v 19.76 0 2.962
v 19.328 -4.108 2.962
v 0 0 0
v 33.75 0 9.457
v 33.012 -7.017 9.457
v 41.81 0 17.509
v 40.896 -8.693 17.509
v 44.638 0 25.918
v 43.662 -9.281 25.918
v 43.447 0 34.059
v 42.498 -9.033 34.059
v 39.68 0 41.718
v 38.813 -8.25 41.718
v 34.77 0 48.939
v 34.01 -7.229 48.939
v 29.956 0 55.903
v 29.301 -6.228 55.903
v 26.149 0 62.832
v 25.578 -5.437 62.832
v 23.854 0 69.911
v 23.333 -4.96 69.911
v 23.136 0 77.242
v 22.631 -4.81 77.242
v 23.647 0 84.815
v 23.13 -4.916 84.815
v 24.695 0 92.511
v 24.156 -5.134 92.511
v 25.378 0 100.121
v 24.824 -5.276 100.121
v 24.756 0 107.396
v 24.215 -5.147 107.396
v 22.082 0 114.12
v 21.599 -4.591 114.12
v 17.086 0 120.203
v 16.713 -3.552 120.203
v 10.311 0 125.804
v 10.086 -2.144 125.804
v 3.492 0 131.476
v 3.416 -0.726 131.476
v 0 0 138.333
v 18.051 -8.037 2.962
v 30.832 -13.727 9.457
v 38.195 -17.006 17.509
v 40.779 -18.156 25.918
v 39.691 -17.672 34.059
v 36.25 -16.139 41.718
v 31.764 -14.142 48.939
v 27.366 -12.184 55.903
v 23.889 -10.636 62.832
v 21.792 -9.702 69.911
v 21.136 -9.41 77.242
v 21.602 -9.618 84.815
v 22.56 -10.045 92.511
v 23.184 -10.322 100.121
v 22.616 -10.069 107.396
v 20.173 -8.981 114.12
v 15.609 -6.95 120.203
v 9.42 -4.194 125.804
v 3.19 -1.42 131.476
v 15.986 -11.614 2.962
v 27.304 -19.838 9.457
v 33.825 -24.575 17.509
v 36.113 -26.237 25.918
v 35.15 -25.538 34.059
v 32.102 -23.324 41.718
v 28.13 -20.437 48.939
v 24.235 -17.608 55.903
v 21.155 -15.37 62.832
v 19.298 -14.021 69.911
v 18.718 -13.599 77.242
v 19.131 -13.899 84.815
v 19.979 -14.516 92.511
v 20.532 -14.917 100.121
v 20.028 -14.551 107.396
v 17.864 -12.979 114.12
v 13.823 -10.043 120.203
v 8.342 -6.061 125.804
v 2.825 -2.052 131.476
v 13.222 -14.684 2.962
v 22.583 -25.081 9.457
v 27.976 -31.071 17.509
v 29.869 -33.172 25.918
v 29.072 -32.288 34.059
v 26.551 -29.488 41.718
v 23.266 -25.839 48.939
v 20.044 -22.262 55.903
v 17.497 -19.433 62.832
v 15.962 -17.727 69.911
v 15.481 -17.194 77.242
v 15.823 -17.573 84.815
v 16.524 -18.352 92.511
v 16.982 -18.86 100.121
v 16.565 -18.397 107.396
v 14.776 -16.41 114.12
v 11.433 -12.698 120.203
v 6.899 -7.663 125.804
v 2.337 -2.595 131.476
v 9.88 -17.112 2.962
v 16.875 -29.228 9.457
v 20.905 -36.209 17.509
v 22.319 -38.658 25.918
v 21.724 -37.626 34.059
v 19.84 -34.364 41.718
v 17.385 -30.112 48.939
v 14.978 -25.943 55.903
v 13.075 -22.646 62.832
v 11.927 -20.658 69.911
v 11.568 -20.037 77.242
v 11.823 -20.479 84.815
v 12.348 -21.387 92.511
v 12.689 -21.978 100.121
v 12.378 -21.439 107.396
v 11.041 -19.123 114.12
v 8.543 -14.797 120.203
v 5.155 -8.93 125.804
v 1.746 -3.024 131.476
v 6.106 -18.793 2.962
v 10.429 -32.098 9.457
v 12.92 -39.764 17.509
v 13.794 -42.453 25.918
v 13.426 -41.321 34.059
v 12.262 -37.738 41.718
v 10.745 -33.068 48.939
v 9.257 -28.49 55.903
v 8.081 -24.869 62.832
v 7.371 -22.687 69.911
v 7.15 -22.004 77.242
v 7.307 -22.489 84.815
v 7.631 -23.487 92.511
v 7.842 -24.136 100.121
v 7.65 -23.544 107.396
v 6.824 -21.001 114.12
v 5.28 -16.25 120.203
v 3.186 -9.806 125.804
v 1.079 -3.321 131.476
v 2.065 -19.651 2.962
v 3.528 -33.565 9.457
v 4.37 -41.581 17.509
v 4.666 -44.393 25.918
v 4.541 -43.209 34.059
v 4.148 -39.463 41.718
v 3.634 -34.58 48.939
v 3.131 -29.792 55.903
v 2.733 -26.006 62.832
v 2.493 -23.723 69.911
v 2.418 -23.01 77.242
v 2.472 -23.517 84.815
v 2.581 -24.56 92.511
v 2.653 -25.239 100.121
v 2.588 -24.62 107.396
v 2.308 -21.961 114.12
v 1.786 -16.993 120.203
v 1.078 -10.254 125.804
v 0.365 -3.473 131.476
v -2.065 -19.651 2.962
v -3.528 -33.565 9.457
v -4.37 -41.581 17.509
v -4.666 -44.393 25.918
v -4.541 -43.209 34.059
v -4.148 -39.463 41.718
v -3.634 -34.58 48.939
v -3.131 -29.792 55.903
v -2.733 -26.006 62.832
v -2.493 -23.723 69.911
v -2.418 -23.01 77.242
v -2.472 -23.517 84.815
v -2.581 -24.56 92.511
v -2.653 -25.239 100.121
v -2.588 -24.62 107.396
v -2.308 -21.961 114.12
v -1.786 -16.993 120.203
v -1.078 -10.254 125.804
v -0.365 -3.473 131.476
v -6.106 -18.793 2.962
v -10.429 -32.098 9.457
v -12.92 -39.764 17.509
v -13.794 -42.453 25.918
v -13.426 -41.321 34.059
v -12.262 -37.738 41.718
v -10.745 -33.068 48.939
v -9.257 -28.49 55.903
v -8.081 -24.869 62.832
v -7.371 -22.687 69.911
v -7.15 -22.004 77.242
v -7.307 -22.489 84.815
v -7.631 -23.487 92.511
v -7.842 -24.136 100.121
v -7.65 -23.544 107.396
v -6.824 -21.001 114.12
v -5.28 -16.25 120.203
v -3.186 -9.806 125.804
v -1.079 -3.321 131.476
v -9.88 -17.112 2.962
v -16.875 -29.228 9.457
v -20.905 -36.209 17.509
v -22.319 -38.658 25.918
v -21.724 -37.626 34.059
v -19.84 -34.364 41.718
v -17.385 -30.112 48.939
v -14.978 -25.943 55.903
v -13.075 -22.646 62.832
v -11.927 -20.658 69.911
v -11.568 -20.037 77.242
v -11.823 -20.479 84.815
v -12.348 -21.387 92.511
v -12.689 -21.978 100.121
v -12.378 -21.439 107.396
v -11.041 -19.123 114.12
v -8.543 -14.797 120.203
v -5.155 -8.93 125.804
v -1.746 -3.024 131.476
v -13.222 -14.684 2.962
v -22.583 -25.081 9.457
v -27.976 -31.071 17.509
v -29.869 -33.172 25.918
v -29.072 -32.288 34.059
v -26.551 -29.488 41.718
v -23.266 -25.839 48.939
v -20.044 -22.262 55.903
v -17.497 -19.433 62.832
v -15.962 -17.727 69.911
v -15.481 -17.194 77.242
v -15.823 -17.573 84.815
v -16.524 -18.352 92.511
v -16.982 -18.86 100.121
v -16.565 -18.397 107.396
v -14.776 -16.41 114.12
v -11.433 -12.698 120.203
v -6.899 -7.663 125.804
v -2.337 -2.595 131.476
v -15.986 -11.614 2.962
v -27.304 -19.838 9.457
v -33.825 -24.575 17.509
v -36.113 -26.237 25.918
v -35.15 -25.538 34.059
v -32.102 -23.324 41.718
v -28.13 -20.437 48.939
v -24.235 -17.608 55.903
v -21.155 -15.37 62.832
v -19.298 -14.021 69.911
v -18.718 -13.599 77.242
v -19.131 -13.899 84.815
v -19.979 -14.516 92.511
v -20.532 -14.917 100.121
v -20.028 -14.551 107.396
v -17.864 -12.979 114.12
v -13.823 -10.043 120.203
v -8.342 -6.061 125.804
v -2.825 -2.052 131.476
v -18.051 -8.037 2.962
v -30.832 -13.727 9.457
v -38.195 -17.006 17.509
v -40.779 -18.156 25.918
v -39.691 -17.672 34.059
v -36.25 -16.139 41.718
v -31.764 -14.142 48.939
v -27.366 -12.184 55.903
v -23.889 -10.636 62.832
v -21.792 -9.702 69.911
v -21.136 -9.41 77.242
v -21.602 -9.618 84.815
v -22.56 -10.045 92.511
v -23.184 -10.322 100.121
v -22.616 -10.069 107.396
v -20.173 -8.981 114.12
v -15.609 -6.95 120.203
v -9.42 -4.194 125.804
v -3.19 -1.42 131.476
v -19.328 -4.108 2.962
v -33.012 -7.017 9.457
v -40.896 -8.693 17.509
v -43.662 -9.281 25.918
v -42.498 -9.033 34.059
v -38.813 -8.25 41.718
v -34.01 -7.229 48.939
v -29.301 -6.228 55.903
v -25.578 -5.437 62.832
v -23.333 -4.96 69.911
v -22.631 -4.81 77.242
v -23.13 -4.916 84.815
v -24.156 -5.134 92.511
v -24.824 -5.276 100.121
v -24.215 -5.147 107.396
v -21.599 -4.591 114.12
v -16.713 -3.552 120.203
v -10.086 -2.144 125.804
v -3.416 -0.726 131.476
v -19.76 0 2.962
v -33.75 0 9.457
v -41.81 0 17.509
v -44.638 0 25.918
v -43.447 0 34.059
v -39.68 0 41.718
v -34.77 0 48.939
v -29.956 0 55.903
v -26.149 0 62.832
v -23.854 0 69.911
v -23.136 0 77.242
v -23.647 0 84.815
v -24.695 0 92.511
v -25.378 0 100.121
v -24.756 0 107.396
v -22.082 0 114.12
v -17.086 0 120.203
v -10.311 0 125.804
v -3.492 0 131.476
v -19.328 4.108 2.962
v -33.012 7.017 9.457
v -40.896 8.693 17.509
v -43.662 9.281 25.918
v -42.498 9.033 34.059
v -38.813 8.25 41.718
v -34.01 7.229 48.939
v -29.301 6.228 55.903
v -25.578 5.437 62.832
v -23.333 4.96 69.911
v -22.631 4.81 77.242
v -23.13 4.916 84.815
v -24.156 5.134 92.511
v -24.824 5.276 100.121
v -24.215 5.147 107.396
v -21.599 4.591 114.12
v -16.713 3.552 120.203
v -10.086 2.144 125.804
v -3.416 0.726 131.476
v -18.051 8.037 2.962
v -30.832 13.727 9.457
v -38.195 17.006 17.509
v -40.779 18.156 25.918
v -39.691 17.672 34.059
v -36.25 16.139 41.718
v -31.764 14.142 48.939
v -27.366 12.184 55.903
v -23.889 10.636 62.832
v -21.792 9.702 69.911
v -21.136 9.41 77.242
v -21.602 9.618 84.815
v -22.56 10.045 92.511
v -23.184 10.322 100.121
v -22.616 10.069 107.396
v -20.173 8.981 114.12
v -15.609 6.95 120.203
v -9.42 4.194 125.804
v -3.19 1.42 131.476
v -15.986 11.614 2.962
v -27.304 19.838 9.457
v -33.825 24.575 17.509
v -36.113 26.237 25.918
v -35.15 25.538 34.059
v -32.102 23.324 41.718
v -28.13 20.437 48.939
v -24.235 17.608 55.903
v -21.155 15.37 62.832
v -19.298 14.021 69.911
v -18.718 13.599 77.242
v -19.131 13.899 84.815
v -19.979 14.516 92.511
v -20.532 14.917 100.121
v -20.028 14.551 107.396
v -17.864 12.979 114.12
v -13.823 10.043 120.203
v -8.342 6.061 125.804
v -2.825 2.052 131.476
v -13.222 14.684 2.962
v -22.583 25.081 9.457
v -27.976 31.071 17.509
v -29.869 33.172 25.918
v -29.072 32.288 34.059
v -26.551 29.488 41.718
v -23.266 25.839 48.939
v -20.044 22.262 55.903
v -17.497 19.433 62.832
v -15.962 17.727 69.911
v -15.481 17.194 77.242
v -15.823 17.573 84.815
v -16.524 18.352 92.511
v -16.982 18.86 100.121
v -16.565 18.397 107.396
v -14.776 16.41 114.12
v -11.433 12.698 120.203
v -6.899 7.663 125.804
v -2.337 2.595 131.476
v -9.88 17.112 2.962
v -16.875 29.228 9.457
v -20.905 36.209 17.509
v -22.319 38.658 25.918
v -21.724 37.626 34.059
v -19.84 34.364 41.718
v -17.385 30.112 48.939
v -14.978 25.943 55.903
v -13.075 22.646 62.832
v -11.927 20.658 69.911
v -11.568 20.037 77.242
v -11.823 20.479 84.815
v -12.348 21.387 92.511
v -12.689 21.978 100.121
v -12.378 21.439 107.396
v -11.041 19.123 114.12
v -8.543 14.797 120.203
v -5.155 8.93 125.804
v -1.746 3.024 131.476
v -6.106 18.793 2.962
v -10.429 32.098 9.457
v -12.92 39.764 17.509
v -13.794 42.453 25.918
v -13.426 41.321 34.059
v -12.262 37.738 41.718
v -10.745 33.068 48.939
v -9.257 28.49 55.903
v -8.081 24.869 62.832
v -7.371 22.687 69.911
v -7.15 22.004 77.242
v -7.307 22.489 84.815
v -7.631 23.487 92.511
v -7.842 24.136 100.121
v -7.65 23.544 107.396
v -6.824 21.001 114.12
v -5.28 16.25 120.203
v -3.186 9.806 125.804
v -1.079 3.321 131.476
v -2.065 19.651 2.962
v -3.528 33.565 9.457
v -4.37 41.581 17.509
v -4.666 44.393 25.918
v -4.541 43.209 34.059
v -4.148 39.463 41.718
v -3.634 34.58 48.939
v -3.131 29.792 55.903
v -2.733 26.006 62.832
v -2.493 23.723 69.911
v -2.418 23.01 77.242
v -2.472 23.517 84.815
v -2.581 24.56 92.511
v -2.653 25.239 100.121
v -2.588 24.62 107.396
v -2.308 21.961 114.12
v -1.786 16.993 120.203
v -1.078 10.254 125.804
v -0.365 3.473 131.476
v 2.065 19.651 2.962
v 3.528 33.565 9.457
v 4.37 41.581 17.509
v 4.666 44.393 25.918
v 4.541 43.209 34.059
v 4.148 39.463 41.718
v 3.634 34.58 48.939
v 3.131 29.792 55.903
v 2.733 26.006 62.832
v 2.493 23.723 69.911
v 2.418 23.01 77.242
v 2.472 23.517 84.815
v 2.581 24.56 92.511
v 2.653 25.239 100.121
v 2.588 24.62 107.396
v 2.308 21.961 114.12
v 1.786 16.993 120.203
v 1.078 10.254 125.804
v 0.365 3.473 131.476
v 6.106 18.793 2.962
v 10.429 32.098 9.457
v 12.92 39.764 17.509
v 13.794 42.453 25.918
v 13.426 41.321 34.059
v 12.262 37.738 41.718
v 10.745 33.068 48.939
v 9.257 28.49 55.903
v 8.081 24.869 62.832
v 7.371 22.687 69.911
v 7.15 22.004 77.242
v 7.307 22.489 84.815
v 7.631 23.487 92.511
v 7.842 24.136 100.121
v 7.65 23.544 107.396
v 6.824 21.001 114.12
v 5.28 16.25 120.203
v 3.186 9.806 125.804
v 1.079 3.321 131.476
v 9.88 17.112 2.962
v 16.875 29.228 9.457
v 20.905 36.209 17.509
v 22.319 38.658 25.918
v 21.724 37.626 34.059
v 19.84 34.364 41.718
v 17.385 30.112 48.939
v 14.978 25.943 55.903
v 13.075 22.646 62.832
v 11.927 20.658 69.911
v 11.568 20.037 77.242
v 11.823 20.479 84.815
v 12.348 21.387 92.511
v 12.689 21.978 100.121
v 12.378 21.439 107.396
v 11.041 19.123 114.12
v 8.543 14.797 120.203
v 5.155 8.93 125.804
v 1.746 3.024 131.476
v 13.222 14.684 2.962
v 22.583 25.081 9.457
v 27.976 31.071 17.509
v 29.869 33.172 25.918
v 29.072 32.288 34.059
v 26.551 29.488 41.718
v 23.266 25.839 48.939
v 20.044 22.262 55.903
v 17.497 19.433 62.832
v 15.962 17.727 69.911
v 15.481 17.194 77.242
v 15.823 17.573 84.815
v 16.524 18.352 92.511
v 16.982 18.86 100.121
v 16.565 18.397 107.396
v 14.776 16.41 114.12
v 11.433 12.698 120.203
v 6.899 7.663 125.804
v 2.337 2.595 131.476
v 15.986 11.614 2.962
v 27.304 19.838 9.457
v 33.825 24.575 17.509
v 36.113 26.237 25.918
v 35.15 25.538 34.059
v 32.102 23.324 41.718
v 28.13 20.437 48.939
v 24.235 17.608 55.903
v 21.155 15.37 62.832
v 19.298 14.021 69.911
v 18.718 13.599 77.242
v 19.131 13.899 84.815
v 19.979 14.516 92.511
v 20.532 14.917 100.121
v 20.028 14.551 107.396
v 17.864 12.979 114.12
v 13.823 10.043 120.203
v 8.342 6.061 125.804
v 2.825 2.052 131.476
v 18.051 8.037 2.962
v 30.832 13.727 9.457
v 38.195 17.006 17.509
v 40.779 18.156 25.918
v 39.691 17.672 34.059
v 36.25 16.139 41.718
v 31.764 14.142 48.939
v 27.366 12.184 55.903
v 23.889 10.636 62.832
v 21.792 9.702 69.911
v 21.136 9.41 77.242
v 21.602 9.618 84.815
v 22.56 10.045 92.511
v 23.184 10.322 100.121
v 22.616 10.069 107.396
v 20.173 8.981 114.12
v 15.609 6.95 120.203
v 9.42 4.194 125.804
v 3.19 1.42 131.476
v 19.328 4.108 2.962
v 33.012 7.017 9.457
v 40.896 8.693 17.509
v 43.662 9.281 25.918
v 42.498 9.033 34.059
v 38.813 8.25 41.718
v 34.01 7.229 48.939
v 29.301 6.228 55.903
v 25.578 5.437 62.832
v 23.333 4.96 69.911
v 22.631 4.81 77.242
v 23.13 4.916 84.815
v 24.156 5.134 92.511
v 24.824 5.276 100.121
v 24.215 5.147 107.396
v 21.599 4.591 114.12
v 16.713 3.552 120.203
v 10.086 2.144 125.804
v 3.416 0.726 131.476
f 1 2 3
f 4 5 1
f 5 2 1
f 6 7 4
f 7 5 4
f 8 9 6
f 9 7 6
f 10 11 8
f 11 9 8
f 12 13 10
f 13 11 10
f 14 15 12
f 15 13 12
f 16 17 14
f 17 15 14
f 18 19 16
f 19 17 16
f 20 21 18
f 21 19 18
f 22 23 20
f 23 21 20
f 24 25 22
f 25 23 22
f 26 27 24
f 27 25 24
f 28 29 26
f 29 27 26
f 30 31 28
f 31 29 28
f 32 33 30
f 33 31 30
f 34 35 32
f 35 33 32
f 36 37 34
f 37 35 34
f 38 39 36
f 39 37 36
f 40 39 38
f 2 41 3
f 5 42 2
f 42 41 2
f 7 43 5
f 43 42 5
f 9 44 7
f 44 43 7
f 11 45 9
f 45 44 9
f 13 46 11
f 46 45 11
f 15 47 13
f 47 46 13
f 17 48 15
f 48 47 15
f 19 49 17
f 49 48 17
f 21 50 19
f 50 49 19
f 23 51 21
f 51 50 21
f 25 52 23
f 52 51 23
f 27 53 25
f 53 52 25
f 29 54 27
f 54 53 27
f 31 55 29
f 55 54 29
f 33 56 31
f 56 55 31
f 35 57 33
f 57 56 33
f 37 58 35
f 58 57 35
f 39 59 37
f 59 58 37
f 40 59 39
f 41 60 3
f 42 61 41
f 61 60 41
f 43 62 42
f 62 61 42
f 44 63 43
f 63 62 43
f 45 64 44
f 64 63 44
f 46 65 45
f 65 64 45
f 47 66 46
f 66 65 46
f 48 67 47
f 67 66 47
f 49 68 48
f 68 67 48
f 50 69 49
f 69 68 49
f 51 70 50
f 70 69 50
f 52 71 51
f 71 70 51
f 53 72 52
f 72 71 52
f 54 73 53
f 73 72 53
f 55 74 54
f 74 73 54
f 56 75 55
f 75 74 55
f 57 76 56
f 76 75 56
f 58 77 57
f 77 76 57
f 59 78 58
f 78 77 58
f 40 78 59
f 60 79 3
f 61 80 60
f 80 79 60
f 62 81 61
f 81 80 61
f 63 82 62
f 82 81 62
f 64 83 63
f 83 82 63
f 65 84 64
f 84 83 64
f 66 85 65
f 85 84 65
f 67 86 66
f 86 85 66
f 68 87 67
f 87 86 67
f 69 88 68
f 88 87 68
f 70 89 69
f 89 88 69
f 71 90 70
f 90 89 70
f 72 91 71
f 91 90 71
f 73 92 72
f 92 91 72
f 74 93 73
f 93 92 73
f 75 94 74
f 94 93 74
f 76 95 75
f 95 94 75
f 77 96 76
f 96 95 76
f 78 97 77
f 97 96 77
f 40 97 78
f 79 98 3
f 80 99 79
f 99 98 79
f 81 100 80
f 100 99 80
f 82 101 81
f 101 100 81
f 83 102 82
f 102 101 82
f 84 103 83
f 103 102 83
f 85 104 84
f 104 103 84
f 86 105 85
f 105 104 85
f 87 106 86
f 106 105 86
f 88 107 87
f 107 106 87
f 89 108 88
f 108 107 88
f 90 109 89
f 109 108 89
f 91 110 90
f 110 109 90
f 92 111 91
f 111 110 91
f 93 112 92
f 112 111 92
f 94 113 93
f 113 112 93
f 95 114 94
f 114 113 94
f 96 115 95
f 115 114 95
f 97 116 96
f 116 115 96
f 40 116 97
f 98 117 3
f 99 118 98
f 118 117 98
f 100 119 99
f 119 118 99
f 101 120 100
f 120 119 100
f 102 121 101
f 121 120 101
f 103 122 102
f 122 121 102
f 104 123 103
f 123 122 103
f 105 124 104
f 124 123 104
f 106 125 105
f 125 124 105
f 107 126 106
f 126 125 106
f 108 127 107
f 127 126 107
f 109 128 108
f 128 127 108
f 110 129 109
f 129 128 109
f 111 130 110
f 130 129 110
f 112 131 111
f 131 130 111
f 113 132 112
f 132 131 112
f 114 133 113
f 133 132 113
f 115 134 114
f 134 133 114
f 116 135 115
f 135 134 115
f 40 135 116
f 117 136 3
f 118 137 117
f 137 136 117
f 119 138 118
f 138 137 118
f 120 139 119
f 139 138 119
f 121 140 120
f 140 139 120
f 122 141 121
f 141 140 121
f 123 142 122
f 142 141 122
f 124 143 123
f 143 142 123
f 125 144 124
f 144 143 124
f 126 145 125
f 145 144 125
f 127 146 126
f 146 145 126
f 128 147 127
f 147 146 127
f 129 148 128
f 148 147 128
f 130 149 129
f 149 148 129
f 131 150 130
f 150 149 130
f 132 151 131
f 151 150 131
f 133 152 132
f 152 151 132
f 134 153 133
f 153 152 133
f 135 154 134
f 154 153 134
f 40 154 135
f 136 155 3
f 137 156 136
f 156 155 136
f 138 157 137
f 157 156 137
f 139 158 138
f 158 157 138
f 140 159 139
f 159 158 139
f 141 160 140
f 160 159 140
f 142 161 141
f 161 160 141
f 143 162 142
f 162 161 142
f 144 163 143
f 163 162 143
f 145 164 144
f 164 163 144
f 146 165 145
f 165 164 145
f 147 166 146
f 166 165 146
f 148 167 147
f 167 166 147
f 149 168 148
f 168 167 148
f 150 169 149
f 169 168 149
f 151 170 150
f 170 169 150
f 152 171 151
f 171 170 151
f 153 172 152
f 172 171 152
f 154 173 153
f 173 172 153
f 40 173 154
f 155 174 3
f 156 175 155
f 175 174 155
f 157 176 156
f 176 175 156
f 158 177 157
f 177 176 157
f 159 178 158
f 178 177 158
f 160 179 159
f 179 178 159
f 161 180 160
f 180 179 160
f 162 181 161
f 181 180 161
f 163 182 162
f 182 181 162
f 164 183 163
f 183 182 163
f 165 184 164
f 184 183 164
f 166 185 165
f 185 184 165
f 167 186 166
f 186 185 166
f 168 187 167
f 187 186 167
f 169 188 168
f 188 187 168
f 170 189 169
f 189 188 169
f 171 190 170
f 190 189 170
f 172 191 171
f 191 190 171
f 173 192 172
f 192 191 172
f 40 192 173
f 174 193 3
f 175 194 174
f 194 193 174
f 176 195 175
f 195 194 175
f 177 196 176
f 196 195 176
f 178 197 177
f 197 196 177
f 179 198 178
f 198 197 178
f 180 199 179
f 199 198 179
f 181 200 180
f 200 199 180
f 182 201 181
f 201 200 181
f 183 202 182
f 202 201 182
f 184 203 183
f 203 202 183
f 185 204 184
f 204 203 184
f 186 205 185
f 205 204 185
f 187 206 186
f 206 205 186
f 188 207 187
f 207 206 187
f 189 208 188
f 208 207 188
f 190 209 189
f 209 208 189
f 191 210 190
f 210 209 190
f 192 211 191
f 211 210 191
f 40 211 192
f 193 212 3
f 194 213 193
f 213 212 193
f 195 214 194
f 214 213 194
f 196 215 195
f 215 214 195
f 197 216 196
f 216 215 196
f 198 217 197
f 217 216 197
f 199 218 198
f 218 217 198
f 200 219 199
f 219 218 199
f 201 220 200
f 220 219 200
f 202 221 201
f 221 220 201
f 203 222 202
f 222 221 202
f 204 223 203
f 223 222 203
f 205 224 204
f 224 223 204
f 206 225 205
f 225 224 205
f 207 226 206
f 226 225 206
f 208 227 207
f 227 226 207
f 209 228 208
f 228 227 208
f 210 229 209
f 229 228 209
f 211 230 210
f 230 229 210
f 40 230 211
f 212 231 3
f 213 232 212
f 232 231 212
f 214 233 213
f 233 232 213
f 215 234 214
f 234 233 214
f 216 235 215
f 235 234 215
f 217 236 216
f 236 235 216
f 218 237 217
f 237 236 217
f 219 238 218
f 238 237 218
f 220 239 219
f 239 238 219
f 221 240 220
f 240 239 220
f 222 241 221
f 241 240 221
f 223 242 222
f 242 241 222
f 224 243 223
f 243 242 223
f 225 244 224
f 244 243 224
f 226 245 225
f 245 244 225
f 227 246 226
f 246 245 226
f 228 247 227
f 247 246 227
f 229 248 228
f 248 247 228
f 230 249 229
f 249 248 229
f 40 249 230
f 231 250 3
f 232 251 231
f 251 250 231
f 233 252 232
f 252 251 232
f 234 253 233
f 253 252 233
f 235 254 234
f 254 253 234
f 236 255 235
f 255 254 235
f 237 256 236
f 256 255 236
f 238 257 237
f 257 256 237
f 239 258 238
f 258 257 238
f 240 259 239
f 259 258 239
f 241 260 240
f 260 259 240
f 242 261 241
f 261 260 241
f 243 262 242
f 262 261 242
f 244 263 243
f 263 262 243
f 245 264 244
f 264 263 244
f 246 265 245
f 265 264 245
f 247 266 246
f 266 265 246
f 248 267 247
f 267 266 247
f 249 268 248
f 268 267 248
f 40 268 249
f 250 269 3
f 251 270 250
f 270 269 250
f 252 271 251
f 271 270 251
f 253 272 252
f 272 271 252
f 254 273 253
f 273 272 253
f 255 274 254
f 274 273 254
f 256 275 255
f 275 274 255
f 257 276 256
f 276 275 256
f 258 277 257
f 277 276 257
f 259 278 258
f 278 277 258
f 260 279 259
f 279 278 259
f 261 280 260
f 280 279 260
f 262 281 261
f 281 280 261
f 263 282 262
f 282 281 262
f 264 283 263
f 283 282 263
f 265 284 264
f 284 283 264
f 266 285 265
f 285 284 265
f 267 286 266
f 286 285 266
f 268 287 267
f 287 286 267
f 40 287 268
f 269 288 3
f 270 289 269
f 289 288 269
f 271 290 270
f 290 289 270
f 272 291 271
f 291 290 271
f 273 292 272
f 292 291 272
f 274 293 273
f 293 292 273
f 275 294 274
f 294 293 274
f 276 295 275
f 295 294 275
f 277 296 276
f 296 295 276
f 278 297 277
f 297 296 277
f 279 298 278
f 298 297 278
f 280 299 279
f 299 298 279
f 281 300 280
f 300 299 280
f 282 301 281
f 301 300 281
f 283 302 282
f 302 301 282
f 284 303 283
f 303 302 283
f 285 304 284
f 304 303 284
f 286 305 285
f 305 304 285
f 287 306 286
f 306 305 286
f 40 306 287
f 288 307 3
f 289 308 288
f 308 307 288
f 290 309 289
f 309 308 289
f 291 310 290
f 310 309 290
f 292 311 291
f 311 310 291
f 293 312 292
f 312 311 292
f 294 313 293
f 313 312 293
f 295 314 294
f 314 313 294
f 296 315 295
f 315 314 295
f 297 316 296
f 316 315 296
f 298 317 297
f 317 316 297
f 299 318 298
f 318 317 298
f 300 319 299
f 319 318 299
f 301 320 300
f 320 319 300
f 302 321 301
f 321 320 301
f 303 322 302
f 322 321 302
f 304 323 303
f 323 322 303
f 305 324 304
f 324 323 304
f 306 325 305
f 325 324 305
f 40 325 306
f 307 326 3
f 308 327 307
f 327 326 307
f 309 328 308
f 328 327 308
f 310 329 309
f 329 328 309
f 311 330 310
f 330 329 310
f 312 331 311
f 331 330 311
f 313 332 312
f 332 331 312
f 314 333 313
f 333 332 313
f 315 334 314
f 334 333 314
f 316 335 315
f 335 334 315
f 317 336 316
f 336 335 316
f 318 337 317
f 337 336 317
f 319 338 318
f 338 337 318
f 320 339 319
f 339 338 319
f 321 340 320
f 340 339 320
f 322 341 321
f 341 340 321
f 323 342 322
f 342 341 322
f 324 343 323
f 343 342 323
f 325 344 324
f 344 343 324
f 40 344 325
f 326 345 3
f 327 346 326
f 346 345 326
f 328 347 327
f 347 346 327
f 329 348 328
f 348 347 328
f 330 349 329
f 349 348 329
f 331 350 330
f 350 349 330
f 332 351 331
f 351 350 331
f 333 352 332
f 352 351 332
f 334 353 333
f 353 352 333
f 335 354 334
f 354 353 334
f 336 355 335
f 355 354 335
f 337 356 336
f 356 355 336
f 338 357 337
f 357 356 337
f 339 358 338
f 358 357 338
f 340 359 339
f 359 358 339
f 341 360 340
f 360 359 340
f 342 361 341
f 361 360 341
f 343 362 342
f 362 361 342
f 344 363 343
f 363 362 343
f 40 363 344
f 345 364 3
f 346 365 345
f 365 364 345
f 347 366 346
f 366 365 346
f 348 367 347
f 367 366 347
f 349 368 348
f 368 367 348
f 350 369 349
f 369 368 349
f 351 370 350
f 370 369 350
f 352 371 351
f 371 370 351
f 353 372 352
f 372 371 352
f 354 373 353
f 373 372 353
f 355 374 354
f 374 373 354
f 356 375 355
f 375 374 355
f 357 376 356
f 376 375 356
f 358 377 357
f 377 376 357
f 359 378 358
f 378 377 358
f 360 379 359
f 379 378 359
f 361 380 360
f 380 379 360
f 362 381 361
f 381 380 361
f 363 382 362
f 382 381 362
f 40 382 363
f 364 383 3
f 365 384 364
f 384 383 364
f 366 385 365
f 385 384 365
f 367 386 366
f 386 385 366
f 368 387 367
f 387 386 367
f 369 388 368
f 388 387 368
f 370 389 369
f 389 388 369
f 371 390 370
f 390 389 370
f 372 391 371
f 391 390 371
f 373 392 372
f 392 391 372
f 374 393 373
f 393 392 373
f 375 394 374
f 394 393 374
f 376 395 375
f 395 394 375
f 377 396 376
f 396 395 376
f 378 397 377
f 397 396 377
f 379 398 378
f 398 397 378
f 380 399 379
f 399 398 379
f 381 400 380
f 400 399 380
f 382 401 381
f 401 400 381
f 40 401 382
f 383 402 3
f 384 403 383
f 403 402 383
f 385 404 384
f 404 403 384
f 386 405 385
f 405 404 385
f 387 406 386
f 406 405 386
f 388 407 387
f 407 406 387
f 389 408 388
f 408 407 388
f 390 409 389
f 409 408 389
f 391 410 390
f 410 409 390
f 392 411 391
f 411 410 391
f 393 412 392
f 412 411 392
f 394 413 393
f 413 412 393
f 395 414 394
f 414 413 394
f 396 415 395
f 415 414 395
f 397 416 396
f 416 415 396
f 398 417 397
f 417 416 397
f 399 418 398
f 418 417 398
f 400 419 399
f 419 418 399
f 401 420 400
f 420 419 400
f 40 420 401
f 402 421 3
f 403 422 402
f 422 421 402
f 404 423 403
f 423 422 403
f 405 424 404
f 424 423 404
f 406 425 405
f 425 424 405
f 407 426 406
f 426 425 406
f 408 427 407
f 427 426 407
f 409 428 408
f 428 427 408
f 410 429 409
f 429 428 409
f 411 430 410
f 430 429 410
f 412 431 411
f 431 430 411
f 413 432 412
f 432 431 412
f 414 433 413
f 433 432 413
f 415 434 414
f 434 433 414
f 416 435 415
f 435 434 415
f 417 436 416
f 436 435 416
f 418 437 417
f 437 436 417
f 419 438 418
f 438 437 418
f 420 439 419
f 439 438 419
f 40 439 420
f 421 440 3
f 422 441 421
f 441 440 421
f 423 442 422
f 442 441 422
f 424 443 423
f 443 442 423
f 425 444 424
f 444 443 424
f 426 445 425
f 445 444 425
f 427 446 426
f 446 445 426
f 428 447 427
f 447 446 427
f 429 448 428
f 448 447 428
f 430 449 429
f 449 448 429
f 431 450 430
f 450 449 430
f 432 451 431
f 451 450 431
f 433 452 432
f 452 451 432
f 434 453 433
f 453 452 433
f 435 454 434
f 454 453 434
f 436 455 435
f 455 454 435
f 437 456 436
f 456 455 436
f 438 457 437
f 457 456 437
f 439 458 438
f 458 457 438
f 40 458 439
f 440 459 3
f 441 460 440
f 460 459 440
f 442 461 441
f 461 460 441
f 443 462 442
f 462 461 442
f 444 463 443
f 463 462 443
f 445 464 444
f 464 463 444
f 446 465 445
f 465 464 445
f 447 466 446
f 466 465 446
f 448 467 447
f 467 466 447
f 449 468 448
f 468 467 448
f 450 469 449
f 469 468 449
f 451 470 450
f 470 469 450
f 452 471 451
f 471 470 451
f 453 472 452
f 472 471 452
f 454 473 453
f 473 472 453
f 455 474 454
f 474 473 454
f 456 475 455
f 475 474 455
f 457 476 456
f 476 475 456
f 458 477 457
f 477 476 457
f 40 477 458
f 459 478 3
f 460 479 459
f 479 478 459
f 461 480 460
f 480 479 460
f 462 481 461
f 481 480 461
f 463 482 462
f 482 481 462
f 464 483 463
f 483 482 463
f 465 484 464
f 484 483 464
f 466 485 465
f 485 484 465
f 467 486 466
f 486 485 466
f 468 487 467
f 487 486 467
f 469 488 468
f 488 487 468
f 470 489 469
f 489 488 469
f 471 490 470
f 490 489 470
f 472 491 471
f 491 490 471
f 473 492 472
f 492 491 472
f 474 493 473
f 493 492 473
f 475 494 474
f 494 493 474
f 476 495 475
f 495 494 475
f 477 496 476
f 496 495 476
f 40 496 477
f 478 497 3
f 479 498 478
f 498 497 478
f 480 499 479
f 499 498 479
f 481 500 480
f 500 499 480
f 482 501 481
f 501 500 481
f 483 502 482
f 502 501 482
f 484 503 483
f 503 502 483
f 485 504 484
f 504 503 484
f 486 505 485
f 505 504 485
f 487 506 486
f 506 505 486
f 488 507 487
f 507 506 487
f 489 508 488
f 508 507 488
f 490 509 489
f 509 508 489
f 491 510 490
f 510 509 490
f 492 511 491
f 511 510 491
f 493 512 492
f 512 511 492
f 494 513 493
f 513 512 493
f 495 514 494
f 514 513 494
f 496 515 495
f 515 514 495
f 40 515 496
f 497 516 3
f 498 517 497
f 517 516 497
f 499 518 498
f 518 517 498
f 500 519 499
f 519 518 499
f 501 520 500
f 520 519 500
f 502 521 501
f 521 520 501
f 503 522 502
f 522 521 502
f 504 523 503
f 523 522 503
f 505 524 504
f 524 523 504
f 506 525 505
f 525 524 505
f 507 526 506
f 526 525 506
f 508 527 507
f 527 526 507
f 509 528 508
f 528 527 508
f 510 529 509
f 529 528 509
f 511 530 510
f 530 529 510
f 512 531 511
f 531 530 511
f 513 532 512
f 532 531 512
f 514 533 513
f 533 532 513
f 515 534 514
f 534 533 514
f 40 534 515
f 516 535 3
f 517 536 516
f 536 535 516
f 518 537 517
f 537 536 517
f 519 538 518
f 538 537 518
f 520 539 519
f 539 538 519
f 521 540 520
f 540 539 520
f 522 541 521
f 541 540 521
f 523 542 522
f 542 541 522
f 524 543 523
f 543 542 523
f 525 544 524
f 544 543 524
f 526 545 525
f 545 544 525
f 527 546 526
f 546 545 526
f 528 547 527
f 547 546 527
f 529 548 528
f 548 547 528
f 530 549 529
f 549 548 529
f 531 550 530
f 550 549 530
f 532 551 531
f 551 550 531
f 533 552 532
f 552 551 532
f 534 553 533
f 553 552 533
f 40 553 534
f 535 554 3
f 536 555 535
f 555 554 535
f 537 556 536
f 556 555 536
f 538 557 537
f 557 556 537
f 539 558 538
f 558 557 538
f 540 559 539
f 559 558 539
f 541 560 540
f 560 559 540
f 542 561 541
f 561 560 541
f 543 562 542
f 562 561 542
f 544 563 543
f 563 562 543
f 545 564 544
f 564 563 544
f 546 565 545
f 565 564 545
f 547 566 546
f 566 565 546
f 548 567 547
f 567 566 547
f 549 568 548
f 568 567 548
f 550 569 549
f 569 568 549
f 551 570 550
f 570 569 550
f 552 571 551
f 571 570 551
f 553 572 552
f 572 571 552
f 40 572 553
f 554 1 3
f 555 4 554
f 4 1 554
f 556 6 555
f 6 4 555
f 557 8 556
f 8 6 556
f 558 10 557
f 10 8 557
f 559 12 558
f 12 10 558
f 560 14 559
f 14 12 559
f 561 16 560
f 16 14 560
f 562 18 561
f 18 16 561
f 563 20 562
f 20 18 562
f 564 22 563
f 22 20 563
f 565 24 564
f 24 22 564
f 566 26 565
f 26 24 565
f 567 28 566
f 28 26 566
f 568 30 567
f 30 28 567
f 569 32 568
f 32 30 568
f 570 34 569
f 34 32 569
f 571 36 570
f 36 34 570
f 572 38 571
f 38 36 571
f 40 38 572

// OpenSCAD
// Define control points
c_y = [37,40,299,109,411,372,452];
c_x = [359,136,93,658,11,357,359];


// Binomial coefficient (n choose k)
function choose(n, k) = factorial(n) / (factorial(k) * factorial(n - k));

// Factorial function
function factorial(n) = n == 0 ? 1 : n * factorial(n - 1);

function sum_list(list, index = 0) =index < len(list) ?
        list[index] + sum_list(list, index + 1) :
        0;


// Function to calculate a single point on the Bezier curve
function bezierPoint(t,coordX,coordY) =[
    sum_list([for (i= [0 : len(coordX)-1]) coordX[i] * choose(len(coordX)-1, i) * pow(t, i) * pow(1-t, len(coordX)-1-i)])
    ,
    sum_list([for (i= [0 : len(coordY)-1]) coordY[i] * choose(len(coordY)-1, i) * pow(t, i) * pow(1-t, len(coordY)-1-i)])
];
    
function get_bezier_curve_points(t_step, c_x,c_y) = 
    [for(t = [0: t_step: 1]) bezierPoint(t,c_x,c_y)];
    
the_points = get_bezier_curve_points(0.05,c_x,c_y);
echo(the_points);
    
    
center_point = the_points[0];
    
    
function convert_points(points) = 
    [for (point = points) [point[0]-center_point[0], point[1]-center_point[1]]];    
        

new_points = convert_points(the_points);
    
spin_path = concat(new_points,[new_points[0]]);

    

rotate_extrude()polygon(spin_path/3);

    
   
